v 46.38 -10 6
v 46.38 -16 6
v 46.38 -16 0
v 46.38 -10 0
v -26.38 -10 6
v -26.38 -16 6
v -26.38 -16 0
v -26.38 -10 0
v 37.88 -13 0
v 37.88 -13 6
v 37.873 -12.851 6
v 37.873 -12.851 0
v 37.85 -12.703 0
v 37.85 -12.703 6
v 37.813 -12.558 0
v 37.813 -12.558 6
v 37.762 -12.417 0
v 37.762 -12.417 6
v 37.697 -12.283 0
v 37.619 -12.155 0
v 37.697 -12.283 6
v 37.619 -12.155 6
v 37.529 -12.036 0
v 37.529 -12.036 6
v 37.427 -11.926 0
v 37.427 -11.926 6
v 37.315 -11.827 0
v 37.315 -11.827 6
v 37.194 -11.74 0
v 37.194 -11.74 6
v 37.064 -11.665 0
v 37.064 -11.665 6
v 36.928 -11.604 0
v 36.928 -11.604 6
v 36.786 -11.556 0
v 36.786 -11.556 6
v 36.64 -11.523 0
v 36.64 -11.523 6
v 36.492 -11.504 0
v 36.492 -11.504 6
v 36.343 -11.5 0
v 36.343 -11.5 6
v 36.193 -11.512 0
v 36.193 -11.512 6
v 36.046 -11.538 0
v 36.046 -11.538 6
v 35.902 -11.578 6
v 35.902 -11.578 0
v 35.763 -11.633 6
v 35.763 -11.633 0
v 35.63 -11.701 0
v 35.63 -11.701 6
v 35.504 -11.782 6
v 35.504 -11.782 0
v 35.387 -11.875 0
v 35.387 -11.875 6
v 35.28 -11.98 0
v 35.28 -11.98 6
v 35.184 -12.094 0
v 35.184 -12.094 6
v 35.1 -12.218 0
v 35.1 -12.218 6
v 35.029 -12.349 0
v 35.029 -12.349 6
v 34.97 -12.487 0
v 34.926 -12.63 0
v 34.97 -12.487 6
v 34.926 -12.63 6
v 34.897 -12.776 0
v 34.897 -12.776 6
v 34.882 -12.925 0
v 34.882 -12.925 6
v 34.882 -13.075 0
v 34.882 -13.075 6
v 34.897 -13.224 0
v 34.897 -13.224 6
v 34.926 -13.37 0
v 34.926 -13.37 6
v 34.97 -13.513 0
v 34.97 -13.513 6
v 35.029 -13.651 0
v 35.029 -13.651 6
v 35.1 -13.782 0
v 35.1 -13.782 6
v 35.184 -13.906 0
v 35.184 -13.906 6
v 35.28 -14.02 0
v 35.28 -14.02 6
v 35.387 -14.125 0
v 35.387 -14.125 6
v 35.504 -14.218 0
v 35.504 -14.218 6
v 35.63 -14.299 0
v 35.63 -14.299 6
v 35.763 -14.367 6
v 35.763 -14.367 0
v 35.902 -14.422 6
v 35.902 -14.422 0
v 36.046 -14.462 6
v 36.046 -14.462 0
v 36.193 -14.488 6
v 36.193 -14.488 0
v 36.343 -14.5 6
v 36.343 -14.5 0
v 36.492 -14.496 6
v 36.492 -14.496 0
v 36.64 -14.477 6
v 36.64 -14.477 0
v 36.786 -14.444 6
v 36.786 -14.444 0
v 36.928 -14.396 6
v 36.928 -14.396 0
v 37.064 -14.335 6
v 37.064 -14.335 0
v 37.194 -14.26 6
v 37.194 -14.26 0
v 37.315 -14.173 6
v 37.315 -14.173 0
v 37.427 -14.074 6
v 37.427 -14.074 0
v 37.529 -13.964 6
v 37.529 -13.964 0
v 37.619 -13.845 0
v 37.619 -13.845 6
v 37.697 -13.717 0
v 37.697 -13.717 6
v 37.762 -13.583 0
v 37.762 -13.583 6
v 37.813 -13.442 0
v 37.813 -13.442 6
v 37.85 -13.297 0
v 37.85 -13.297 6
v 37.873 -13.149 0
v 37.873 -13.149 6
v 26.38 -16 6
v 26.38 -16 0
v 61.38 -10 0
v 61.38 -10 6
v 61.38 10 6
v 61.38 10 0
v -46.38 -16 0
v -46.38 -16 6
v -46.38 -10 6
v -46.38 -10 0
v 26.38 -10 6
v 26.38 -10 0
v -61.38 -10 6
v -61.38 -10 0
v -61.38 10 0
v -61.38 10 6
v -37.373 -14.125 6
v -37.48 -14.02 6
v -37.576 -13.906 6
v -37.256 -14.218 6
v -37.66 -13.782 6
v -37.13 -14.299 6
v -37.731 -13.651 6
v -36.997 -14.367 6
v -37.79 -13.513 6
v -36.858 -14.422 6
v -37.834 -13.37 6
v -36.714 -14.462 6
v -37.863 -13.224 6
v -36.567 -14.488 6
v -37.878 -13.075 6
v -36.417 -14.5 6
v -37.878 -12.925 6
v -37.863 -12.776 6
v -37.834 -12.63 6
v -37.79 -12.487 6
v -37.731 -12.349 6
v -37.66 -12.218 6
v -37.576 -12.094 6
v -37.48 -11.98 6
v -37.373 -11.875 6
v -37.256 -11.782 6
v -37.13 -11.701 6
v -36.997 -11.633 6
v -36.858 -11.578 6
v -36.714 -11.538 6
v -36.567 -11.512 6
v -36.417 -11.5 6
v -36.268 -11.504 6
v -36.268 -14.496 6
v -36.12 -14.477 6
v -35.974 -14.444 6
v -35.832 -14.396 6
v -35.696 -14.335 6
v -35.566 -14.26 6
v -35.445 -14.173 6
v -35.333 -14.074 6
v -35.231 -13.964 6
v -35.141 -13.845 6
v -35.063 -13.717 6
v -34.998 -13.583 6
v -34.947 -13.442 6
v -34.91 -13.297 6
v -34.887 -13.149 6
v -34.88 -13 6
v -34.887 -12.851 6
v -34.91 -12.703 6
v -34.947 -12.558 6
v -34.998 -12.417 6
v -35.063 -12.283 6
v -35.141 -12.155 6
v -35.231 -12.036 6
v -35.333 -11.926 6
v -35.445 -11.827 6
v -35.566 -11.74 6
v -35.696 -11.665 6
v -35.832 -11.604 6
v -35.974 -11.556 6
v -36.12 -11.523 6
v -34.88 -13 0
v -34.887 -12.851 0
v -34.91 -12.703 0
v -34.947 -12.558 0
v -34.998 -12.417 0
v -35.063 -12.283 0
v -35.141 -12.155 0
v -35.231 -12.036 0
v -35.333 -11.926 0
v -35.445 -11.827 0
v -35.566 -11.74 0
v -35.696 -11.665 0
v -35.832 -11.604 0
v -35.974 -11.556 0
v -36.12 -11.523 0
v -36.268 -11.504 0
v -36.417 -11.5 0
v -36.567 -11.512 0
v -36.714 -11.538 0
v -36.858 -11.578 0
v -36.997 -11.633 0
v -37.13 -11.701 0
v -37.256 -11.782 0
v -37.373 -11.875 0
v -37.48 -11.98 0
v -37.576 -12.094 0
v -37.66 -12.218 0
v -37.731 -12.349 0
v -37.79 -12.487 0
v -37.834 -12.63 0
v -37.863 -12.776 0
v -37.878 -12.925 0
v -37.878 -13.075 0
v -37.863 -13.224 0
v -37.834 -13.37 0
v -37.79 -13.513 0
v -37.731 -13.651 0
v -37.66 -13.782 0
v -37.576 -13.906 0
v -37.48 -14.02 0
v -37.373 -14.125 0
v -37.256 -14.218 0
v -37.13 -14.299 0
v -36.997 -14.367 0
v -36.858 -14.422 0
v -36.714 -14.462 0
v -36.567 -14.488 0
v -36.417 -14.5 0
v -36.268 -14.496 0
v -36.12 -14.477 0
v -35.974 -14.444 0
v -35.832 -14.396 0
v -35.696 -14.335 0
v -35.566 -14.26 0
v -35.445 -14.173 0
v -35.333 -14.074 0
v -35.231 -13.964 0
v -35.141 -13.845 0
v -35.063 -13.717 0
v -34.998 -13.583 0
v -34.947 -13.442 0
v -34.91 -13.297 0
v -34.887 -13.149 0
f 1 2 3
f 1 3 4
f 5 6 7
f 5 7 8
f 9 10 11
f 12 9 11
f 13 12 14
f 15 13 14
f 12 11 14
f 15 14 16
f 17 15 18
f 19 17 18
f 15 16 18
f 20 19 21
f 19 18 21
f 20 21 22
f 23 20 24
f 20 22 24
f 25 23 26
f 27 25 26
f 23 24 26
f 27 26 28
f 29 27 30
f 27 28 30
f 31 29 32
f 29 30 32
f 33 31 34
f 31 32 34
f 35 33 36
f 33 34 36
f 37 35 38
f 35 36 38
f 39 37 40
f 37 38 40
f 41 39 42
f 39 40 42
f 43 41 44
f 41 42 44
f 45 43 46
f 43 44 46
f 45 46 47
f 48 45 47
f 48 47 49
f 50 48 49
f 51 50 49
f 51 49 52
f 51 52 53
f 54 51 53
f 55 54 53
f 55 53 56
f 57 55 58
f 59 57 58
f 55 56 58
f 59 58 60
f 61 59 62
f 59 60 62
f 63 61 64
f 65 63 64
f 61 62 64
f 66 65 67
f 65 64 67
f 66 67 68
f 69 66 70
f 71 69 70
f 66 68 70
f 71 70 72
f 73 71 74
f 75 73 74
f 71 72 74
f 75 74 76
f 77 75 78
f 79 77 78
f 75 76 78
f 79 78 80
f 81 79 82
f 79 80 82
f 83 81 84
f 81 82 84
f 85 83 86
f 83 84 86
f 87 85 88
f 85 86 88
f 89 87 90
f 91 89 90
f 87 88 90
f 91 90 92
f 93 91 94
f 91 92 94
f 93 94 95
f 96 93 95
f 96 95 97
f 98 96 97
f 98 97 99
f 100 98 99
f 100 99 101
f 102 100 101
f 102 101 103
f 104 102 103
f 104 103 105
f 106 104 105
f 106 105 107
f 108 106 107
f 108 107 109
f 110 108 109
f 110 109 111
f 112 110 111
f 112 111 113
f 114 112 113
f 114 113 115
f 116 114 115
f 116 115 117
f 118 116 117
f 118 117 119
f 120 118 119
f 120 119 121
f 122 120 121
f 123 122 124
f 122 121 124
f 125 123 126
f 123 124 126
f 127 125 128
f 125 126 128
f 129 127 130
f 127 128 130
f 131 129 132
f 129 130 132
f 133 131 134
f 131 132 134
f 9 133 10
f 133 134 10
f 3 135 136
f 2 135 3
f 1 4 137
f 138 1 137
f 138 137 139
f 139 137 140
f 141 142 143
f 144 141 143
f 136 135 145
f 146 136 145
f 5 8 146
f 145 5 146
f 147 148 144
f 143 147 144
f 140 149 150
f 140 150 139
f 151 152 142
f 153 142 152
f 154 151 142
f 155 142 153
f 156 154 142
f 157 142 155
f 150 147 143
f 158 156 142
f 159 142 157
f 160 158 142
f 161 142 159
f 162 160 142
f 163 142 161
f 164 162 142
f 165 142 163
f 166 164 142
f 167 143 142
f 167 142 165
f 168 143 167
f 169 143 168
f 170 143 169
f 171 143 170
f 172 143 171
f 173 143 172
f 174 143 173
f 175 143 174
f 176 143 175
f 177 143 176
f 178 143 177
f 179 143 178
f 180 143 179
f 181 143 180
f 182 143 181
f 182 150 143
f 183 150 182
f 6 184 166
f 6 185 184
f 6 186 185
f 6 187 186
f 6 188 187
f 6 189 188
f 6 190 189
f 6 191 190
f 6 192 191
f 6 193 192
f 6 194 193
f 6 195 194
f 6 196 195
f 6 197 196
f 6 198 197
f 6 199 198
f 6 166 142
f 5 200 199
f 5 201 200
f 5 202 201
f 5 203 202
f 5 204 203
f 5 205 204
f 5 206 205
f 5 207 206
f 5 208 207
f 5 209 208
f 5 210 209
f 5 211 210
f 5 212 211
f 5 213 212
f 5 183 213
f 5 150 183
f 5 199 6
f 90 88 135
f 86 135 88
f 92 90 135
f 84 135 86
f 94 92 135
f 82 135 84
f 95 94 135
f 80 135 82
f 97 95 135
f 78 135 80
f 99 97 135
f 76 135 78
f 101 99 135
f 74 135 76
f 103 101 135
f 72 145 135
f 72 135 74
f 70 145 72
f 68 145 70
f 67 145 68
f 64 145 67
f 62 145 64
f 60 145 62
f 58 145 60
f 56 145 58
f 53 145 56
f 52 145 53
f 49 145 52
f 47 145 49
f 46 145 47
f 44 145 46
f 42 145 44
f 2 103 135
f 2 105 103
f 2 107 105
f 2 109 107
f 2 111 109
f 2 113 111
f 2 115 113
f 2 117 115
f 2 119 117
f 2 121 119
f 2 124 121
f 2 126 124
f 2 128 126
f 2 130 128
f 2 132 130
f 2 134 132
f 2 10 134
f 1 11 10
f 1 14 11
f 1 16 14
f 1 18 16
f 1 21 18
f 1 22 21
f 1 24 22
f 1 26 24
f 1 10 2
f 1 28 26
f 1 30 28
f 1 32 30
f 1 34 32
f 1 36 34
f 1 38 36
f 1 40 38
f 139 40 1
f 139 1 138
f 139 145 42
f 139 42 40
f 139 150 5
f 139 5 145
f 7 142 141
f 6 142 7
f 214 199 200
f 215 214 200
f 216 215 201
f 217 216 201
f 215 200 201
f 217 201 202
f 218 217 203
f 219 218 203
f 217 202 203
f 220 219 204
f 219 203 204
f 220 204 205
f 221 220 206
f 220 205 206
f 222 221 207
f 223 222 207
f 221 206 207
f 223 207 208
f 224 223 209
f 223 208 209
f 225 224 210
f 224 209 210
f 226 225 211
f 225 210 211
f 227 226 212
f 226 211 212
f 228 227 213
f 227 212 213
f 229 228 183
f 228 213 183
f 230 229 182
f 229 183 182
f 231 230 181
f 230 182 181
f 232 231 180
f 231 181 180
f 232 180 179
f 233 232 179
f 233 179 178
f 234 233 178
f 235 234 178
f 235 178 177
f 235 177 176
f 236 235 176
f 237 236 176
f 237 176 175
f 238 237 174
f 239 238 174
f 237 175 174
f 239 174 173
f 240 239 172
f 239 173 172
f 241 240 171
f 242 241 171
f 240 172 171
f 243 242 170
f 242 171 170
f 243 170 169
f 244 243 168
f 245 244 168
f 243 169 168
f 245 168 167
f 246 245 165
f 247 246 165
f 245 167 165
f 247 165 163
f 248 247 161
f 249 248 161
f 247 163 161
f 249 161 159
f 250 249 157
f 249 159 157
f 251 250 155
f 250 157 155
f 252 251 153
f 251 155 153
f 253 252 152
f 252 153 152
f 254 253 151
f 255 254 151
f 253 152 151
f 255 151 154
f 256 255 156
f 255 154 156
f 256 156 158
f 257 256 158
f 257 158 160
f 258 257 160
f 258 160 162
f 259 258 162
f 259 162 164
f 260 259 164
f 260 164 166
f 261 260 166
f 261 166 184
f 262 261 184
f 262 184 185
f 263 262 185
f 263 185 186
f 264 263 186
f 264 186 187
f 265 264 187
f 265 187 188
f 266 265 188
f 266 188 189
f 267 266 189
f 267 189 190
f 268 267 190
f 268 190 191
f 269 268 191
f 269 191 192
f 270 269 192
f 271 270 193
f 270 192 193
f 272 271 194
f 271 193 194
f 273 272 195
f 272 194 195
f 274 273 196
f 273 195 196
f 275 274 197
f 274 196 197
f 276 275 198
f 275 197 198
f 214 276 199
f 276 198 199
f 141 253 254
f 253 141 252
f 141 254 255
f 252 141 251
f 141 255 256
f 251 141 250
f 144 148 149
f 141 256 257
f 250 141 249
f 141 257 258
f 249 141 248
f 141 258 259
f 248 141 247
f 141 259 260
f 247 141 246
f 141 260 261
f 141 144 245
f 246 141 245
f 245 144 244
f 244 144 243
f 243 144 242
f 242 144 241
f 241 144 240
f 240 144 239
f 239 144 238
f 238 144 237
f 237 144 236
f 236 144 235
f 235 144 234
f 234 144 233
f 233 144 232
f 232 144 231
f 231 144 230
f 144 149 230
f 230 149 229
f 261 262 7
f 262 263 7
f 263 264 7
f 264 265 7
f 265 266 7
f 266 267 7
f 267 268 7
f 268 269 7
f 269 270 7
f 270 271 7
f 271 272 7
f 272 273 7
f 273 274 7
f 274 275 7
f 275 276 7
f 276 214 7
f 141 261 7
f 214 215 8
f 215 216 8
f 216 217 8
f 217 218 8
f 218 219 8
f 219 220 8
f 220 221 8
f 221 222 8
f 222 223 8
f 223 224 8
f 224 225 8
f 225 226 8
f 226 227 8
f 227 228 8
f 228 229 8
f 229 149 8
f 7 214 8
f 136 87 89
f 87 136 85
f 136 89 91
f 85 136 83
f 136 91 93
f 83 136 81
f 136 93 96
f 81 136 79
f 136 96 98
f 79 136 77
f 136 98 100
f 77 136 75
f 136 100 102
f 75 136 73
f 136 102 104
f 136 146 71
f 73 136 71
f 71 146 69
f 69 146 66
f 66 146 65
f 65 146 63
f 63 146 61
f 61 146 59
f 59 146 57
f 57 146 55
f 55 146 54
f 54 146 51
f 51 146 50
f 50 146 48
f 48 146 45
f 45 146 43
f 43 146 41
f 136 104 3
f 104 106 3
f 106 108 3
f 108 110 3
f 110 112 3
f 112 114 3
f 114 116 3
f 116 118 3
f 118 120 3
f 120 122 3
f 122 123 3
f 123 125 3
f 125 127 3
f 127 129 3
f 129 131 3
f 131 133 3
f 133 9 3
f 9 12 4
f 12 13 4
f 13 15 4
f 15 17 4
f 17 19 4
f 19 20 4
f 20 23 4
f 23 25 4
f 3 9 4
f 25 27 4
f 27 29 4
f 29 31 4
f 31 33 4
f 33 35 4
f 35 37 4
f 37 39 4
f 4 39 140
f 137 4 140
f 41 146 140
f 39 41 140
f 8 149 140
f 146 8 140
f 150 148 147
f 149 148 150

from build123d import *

# Parameters (mm, degrees)
ESQUISSE1_W             = 122.76
ESQUISSE1_H             = 20
BOSS_EXTRU_1_DEPTH      = 6
ESQUISSE2_W             = 20
ESQUISSE2_H             = 6
BOSS_EXTRU_2_DEPTH      = 6
ESQUISSE3_R             = 1.5
ENL_V_MAT_EXTRU_1_DEPTH = 6


with BuildPart() as part:
    # Esquisse1 → Boss.-Extru.1 (new body)
    with BuildSketch(Plane.XY):
        Rectangle(ESQUISSE1_W, ESQUISSE1_H)
    extrude(amount=BOSS_EXTRU_1_DEPTH)

    # Esquisse2 → Boss.-Extru.2 (add)
    with BuildSketch(Plane.XY.offset(6)):
        with Locations((-36.38, -13)):
            Rectangle(ESQUISSE2_W, ESQUISSE2_H)
        with Locations((36.38, -13)):
            Rectangle(ESQUISSE2_W, ESQUISSE2_H)
    extrude(amount=-BOSS_EXTRU_2_DEPTH)

    # Esquisse3 → Enlèv. mat.-Extru.1 (cut)
    with BuildSketch(Plane.XY.offset(6)):
        with Locations((-36.38, -13)):
            Circle(ESQUISSE3_R)
        with Locations((36.38, -13)):
            Circle(ESQUISSE3_R)
    extrude(amount=-ENL_V_MAT_EXTRU_1_DEPTH, mode=Mode.SUBTRACT)


solid = part.part
